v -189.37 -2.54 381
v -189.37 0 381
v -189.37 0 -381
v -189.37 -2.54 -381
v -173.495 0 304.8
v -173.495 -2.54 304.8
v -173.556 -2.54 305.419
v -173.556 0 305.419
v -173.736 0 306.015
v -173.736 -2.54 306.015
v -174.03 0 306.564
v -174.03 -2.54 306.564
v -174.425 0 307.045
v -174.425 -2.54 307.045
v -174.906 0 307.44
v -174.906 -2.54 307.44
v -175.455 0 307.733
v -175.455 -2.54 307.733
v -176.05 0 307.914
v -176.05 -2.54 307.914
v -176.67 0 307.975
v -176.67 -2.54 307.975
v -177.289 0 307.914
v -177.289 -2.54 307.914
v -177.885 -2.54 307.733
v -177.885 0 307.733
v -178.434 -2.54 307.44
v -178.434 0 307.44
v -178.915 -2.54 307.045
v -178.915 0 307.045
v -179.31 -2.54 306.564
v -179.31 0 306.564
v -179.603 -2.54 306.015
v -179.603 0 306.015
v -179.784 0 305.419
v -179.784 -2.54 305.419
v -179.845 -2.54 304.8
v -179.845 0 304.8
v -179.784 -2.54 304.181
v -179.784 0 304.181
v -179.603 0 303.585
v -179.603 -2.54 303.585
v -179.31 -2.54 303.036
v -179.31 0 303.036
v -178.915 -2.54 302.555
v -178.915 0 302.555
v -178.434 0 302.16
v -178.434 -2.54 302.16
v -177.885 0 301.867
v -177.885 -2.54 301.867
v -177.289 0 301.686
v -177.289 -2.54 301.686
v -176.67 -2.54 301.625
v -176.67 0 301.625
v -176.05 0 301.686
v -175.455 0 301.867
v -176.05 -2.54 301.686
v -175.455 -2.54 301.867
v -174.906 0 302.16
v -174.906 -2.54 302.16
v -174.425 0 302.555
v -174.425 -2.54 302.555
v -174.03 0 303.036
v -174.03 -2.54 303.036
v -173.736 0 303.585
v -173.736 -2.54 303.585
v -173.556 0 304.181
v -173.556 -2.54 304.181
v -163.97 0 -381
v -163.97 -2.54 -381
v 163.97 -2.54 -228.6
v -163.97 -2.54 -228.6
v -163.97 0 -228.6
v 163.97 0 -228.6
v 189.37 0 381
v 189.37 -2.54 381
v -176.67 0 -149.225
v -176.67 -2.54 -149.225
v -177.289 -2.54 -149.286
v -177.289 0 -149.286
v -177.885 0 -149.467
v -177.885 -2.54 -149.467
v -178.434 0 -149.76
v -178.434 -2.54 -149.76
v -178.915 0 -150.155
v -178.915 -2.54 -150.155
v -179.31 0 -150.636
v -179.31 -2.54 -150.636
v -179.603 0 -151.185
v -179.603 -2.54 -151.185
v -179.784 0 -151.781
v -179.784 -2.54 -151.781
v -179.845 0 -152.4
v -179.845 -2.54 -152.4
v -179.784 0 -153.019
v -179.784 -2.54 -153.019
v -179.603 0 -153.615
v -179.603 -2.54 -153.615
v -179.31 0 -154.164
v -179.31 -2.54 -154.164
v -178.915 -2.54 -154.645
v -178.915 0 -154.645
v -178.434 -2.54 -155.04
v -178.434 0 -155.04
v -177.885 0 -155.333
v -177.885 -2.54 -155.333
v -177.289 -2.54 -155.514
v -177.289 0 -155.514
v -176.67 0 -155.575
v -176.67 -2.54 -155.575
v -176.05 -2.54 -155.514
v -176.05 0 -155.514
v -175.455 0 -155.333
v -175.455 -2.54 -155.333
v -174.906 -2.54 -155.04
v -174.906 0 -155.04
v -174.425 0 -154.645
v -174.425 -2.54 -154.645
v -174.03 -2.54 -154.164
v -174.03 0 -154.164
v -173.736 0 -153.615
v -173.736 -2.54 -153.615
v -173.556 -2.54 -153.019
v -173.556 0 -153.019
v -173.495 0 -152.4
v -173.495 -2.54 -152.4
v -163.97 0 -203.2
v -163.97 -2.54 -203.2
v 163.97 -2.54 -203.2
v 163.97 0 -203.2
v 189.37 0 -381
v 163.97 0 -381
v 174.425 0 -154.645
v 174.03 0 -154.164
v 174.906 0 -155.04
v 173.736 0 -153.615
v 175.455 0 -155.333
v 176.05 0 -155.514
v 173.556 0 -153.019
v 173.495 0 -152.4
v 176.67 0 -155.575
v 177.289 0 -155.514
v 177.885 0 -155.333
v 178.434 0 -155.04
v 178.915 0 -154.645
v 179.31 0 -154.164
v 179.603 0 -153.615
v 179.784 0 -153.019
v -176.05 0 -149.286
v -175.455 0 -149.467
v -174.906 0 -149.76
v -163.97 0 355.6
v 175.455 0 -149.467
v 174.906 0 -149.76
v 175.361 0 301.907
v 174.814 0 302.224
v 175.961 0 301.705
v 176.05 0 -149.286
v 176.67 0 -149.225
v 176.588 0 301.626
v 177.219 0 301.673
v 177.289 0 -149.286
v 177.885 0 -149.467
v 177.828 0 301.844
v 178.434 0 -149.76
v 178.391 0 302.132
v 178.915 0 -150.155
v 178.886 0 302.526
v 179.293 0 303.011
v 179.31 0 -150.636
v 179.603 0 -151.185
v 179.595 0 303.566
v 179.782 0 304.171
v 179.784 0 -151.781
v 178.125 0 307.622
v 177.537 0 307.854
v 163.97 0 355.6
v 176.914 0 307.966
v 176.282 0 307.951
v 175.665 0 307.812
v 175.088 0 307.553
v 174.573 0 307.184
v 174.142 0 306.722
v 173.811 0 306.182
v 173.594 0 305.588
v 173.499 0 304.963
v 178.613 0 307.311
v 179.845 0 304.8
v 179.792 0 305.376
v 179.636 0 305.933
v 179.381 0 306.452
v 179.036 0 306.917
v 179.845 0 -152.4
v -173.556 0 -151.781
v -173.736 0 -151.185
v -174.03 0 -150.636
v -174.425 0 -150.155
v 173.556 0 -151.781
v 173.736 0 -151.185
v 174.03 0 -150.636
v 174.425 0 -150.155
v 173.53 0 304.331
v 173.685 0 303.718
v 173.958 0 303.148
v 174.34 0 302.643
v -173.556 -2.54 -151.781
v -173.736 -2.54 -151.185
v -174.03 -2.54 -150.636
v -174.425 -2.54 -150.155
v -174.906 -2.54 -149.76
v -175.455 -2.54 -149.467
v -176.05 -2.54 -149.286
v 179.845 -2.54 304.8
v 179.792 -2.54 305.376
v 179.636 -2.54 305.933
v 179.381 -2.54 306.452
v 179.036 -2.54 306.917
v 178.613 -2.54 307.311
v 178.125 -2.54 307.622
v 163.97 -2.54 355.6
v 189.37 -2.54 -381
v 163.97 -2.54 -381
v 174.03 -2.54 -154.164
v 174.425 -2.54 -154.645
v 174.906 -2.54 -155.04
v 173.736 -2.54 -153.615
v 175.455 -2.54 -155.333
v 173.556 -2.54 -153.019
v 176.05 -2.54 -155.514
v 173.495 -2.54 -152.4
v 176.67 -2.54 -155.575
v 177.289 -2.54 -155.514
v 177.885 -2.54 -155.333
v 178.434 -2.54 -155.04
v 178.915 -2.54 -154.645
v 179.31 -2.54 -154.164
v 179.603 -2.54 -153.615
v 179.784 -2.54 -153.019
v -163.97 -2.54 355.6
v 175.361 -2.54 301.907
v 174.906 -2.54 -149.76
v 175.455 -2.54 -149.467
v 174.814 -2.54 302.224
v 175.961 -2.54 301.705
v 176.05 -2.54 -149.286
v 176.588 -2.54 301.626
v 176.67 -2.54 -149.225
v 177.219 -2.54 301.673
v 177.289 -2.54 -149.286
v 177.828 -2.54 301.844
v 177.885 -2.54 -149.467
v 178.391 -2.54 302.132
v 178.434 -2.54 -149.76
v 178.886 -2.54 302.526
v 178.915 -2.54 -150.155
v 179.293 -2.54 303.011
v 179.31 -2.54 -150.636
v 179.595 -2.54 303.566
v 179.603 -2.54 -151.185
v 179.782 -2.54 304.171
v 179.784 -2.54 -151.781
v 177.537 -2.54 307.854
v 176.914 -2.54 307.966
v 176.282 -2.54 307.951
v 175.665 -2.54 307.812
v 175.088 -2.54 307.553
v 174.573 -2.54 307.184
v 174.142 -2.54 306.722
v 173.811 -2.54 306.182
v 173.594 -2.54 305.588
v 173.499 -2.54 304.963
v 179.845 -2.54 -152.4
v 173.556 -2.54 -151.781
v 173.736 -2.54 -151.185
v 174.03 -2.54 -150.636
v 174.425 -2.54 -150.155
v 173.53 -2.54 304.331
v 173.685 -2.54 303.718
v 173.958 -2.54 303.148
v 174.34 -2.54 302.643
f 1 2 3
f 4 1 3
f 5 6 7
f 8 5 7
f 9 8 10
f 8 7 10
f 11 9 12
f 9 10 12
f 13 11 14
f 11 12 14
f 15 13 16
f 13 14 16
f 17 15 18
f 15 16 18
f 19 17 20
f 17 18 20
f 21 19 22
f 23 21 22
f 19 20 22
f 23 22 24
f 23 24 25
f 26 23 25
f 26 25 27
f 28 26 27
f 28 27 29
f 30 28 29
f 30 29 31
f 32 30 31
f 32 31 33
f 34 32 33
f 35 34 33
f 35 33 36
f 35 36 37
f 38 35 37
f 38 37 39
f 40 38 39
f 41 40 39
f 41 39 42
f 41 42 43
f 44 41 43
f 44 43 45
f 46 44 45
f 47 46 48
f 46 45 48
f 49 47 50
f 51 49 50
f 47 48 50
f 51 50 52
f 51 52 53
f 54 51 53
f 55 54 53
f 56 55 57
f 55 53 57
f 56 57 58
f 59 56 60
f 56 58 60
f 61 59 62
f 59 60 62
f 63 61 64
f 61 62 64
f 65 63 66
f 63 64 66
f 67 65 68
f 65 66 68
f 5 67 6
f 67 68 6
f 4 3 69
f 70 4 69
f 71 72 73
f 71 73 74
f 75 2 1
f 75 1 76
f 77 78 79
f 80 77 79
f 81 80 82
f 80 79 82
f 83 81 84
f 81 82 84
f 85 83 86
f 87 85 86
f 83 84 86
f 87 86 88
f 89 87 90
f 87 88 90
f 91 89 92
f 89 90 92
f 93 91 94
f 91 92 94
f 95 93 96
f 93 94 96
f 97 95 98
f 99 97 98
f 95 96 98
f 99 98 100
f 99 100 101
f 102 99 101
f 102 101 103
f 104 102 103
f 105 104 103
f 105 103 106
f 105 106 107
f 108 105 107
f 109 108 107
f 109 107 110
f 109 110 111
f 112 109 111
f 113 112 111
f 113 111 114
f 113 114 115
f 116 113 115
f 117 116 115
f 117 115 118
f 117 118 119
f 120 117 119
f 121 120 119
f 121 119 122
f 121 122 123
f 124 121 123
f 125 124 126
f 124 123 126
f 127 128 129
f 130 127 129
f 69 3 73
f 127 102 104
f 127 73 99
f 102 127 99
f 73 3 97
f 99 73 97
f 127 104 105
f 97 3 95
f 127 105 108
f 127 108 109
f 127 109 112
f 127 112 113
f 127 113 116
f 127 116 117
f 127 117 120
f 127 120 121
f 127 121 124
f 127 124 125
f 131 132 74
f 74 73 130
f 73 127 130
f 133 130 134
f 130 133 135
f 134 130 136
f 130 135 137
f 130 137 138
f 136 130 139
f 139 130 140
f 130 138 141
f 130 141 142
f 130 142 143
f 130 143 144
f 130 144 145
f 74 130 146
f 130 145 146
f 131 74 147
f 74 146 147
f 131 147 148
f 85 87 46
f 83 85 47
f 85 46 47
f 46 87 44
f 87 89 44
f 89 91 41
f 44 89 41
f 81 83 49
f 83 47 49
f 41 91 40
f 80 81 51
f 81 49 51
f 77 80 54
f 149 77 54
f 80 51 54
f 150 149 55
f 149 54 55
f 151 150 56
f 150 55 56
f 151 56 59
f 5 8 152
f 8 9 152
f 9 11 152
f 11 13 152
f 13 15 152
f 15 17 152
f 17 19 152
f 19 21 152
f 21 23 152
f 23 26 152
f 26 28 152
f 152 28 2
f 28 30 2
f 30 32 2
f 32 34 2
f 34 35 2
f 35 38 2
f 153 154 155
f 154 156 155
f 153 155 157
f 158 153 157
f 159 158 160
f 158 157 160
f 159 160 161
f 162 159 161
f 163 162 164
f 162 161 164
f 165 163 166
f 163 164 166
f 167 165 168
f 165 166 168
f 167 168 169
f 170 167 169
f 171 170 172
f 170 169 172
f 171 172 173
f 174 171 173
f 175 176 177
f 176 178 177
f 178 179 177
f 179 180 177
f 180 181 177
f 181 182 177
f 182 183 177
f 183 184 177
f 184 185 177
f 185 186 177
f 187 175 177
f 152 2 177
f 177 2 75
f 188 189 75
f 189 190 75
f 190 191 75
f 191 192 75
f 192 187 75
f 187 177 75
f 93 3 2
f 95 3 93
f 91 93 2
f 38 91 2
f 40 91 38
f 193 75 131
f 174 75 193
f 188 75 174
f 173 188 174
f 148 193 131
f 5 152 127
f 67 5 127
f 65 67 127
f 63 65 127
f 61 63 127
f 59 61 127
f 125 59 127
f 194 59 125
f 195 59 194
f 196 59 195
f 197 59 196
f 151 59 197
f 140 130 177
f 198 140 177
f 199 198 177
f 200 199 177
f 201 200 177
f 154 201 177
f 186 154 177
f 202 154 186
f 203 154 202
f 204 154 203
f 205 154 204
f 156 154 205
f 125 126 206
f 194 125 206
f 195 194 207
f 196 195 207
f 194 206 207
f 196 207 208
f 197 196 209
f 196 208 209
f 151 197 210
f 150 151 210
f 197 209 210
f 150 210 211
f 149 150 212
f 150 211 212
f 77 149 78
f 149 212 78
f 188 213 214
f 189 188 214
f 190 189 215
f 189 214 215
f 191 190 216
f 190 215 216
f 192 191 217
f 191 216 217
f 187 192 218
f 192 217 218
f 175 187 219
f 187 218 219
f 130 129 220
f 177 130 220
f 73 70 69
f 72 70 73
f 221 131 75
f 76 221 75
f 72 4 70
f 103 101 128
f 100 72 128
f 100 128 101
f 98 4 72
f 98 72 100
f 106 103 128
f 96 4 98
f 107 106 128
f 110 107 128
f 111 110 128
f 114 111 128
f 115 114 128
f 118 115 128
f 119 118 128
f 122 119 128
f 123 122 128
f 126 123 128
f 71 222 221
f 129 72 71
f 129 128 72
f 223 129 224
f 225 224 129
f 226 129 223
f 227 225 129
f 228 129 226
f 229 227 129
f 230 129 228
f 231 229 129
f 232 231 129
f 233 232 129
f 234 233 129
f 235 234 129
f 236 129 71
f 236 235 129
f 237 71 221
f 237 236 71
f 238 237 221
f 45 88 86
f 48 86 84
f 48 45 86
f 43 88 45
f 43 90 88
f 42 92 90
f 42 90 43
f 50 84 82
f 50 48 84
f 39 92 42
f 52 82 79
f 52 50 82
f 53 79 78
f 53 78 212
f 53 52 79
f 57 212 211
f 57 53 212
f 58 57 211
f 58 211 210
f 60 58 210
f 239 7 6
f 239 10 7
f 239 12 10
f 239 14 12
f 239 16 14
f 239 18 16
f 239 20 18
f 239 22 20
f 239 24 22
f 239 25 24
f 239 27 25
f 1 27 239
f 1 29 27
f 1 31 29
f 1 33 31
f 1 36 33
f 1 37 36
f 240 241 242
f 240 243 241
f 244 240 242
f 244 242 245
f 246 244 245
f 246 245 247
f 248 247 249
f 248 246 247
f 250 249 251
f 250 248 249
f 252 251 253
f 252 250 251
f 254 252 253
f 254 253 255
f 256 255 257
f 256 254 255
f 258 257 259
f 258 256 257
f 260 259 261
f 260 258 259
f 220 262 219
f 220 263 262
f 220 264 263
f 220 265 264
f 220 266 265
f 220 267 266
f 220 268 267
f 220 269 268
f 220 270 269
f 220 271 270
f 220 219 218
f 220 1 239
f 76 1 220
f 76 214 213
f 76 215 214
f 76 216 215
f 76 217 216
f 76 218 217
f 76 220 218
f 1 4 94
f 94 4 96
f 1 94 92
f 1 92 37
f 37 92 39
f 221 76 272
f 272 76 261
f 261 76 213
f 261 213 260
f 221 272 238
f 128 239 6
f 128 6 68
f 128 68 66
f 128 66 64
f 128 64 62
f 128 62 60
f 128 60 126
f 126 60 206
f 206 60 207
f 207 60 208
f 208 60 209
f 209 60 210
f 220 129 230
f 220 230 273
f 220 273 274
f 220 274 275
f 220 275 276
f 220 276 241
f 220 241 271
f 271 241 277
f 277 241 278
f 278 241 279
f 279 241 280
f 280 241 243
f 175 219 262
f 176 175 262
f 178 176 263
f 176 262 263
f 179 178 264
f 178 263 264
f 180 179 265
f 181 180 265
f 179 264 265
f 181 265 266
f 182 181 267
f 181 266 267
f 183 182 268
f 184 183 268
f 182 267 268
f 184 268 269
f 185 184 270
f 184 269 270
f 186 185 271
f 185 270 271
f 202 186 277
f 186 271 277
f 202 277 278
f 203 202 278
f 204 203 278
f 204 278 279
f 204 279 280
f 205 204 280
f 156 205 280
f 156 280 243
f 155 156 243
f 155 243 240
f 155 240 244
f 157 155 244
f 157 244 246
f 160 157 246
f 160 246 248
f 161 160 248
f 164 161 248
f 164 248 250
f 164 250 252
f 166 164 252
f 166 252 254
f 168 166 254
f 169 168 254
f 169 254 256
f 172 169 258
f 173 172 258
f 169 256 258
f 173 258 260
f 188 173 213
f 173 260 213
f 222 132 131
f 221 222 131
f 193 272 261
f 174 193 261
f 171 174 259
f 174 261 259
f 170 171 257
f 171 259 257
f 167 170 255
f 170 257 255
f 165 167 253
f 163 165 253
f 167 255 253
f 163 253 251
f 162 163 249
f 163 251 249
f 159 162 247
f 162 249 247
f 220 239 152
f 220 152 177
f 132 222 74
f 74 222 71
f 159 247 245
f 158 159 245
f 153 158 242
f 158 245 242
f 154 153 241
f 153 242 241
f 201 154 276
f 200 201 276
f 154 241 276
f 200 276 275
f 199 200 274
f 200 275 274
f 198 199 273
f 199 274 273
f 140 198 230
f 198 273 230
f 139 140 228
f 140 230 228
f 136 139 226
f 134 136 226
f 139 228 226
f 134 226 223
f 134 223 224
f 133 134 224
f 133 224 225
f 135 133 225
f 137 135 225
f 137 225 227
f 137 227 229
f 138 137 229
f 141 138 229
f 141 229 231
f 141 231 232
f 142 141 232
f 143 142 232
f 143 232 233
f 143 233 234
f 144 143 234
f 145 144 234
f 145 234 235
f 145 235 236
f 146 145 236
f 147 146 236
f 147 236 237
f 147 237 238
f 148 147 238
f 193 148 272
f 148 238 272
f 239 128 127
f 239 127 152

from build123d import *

# Parameters (mm, degrees)
F0_W     = 378.7394
F0_H     = 751.84
F0_H_2   = 10.16
F1_DEPTH = 2.54
F2_W     = 327.9394
F2_H     = 152.4
F2_H_2   = 558.8
F2_R     = 3.175
F3_DEPTH = 2.541


# Not quite as in the source:
# - a length typed as a fraction of an inch, garbled in the dataset ("3 / 203.2 mm" for 3/8 in), is restored


with BuildPart() as f1:
    # F0 (on Front) → F1 (new body)
    with BuildSketch(Plane.XZ):
        with Locations((0, -5.08)):
            Rectangle(F0_W, F0_H)
        with Locations((0, 375.92)):
            Rectangle(F0_W, F0_H_2)
    extrude(amount=F1_DEPTH)

    # F2 (on face) → F3 (cut, through all)
    with BuildSketch(Plane.XZ.offset(2.54)):
        with Locations((0, -304.8)):
            Rectangle(F2_W, F2_H)
        with Locations((0, 76.2)):
            Rectangle(F2_W, F2_H_2)
        with BuildLine():
            ThreePointArc((178.1250186398, 307.6218208052), (173.9584953156, 303.1477306033), (179.8447, 304.8))
            ThreePointArc((179.8447, 304.8), (179.3809046844, 306.4522693967), (178.1250186398, 307.6218208052))
        make_face()
        with BuildLine():
            ThreePointArc((176.6697, -149.225), (174.4246359697, -154.6450640303), (179.8447, -152.4))
            ThreePointArc((179.8447, -152.4), (178.9147640303, -150.1549359697), (176.6697, -149.225))
        make_face()
        with BuildLine():
            ThreePointArc((-176.6697, -149.225), (-178.9147640303, -154.6450640303), (-173.4947, -152.4))
            ThreePointArc((-173.4947, -152.4), (-174.4246359697, -150.1549359697), (-176.6697, -149.225))
        make_face()
        with Locations((-176.6697, 304.8)):
            Circle(F2_R)
    extrude(amount=-F3_DEPTH, mode=Mode.SUBTRACT)


solid = f1.part
